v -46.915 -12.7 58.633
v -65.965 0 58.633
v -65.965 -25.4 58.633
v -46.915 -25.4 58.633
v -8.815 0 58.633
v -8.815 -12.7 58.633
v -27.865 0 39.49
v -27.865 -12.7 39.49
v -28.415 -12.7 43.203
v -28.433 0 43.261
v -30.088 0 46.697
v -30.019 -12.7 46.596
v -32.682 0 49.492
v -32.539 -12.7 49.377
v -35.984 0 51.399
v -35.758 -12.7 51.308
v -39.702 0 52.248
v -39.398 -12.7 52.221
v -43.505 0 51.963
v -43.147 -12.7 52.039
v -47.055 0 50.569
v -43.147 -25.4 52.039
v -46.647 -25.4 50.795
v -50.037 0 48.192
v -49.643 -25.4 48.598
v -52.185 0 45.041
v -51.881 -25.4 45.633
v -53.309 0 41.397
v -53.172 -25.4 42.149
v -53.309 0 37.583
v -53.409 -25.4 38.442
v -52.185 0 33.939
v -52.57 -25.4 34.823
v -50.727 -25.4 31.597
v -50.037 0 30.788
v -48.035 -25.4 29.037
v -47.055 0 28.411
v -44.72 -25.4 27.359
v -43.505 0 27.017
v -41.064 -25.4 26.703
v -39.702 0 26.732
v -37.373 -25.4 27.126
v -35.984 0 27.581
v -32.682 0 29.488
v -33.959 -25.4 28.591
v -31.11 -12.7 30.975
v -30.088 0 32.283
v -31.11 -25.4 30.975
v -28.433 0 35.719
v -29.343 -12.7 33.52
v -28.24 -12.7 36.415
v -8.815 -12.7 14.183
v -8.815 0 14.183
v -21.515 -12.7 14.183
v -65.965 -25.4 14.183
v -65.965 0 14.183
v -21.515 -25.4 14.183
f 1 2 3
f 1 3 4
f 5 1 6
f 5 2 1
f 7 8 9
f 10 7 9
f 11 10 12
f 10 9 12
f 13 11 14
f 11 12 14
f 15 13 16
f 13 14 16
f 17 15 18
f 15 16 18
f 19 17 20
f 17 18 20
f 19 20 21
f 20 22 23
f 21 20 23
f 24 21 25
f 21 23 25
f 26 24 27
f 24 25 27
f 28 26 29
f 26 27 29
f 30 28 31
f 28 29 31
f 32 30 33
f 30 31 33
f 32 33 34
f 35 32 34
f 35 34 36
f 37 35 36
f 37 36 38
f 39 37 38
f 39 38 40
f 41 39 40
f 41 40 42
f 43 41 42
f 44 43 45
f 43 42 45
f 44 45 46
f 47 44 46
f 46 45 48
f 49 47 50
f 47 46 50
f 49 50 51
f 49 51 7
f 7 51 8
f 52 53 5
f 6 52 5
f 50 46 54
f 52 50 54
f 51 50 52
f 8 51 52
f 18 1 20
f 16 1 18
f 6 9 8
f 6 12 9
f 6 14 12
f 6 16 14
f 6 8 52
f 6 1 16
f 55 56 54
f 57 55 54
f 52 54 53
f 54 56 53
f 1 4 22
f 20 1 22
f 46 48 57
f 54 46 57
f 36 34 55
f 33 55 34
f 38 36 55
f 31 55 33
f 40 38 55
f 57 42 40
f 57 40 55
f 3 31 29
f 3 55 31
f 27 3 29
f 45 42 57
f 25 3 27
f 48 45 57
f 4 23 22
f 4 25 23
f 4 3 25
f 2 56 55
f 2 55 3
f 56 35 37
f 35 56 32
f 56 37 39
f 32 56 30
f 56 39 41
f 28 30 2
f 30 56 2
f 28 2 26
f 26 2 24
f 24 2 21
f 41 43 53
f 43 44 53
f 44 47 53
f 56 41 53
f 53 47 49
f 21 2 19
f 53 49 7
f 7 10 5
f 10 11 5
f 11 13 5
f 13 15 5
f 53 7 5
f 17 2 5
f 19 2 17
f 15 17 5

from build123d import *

# Parameters (mm, degrees)
F0_W     = 57.15
F0_H     = 44.45
F1_DEPTH = 25.4
F2_R     = 12.793463
F3_DEPTH = 25.4
F4_W     = 12.7
F4_H     = 12.7
F5_DEPTH = 44.45
F7_DEPTH = 12.7


with BuildPart() as f1:
    # F0 (on Front) → F1 (new body)
    with BuildSketch(Plane.XZ):
        with Locations((-37.38983, 36.408463)):
            Rectangle(F0_W, F0_H)
    extrude(amount=F1_DEPTH)

    # F2 (on face) → F3 (cut)
    with BuildSketch(Plane.XZ.offset(25.4)):
        with Locations((-40.658294, 39.49)):
            Circle(F2_R)
    extrude(amount=-F3_DEPTH, mode=Mode.SUBTRACT)

    # F4 (on face) → F5 (cut)
    with BuildSketch(Plane.XY.offset(58.633463)):
        with Locations((-15.16483, -19.05)):
            Rectangle(F4_W, F4_H)
    extrude(amount=-F5_DEPTH, mode=Mode.SUBTRACT)

    # F6 (on face) → F7 (cut)
    with BuildSketch(Plane.XZ.offset(25.4)):
        Polygon((-21.51483, 58.633463), (-46.91483, 58.633463), (-21.51483, 14.183463), align=None)
    extrude(amount=-F7_DEPTH, mode=Mode.SUBTRACT)


solid = f1.part
